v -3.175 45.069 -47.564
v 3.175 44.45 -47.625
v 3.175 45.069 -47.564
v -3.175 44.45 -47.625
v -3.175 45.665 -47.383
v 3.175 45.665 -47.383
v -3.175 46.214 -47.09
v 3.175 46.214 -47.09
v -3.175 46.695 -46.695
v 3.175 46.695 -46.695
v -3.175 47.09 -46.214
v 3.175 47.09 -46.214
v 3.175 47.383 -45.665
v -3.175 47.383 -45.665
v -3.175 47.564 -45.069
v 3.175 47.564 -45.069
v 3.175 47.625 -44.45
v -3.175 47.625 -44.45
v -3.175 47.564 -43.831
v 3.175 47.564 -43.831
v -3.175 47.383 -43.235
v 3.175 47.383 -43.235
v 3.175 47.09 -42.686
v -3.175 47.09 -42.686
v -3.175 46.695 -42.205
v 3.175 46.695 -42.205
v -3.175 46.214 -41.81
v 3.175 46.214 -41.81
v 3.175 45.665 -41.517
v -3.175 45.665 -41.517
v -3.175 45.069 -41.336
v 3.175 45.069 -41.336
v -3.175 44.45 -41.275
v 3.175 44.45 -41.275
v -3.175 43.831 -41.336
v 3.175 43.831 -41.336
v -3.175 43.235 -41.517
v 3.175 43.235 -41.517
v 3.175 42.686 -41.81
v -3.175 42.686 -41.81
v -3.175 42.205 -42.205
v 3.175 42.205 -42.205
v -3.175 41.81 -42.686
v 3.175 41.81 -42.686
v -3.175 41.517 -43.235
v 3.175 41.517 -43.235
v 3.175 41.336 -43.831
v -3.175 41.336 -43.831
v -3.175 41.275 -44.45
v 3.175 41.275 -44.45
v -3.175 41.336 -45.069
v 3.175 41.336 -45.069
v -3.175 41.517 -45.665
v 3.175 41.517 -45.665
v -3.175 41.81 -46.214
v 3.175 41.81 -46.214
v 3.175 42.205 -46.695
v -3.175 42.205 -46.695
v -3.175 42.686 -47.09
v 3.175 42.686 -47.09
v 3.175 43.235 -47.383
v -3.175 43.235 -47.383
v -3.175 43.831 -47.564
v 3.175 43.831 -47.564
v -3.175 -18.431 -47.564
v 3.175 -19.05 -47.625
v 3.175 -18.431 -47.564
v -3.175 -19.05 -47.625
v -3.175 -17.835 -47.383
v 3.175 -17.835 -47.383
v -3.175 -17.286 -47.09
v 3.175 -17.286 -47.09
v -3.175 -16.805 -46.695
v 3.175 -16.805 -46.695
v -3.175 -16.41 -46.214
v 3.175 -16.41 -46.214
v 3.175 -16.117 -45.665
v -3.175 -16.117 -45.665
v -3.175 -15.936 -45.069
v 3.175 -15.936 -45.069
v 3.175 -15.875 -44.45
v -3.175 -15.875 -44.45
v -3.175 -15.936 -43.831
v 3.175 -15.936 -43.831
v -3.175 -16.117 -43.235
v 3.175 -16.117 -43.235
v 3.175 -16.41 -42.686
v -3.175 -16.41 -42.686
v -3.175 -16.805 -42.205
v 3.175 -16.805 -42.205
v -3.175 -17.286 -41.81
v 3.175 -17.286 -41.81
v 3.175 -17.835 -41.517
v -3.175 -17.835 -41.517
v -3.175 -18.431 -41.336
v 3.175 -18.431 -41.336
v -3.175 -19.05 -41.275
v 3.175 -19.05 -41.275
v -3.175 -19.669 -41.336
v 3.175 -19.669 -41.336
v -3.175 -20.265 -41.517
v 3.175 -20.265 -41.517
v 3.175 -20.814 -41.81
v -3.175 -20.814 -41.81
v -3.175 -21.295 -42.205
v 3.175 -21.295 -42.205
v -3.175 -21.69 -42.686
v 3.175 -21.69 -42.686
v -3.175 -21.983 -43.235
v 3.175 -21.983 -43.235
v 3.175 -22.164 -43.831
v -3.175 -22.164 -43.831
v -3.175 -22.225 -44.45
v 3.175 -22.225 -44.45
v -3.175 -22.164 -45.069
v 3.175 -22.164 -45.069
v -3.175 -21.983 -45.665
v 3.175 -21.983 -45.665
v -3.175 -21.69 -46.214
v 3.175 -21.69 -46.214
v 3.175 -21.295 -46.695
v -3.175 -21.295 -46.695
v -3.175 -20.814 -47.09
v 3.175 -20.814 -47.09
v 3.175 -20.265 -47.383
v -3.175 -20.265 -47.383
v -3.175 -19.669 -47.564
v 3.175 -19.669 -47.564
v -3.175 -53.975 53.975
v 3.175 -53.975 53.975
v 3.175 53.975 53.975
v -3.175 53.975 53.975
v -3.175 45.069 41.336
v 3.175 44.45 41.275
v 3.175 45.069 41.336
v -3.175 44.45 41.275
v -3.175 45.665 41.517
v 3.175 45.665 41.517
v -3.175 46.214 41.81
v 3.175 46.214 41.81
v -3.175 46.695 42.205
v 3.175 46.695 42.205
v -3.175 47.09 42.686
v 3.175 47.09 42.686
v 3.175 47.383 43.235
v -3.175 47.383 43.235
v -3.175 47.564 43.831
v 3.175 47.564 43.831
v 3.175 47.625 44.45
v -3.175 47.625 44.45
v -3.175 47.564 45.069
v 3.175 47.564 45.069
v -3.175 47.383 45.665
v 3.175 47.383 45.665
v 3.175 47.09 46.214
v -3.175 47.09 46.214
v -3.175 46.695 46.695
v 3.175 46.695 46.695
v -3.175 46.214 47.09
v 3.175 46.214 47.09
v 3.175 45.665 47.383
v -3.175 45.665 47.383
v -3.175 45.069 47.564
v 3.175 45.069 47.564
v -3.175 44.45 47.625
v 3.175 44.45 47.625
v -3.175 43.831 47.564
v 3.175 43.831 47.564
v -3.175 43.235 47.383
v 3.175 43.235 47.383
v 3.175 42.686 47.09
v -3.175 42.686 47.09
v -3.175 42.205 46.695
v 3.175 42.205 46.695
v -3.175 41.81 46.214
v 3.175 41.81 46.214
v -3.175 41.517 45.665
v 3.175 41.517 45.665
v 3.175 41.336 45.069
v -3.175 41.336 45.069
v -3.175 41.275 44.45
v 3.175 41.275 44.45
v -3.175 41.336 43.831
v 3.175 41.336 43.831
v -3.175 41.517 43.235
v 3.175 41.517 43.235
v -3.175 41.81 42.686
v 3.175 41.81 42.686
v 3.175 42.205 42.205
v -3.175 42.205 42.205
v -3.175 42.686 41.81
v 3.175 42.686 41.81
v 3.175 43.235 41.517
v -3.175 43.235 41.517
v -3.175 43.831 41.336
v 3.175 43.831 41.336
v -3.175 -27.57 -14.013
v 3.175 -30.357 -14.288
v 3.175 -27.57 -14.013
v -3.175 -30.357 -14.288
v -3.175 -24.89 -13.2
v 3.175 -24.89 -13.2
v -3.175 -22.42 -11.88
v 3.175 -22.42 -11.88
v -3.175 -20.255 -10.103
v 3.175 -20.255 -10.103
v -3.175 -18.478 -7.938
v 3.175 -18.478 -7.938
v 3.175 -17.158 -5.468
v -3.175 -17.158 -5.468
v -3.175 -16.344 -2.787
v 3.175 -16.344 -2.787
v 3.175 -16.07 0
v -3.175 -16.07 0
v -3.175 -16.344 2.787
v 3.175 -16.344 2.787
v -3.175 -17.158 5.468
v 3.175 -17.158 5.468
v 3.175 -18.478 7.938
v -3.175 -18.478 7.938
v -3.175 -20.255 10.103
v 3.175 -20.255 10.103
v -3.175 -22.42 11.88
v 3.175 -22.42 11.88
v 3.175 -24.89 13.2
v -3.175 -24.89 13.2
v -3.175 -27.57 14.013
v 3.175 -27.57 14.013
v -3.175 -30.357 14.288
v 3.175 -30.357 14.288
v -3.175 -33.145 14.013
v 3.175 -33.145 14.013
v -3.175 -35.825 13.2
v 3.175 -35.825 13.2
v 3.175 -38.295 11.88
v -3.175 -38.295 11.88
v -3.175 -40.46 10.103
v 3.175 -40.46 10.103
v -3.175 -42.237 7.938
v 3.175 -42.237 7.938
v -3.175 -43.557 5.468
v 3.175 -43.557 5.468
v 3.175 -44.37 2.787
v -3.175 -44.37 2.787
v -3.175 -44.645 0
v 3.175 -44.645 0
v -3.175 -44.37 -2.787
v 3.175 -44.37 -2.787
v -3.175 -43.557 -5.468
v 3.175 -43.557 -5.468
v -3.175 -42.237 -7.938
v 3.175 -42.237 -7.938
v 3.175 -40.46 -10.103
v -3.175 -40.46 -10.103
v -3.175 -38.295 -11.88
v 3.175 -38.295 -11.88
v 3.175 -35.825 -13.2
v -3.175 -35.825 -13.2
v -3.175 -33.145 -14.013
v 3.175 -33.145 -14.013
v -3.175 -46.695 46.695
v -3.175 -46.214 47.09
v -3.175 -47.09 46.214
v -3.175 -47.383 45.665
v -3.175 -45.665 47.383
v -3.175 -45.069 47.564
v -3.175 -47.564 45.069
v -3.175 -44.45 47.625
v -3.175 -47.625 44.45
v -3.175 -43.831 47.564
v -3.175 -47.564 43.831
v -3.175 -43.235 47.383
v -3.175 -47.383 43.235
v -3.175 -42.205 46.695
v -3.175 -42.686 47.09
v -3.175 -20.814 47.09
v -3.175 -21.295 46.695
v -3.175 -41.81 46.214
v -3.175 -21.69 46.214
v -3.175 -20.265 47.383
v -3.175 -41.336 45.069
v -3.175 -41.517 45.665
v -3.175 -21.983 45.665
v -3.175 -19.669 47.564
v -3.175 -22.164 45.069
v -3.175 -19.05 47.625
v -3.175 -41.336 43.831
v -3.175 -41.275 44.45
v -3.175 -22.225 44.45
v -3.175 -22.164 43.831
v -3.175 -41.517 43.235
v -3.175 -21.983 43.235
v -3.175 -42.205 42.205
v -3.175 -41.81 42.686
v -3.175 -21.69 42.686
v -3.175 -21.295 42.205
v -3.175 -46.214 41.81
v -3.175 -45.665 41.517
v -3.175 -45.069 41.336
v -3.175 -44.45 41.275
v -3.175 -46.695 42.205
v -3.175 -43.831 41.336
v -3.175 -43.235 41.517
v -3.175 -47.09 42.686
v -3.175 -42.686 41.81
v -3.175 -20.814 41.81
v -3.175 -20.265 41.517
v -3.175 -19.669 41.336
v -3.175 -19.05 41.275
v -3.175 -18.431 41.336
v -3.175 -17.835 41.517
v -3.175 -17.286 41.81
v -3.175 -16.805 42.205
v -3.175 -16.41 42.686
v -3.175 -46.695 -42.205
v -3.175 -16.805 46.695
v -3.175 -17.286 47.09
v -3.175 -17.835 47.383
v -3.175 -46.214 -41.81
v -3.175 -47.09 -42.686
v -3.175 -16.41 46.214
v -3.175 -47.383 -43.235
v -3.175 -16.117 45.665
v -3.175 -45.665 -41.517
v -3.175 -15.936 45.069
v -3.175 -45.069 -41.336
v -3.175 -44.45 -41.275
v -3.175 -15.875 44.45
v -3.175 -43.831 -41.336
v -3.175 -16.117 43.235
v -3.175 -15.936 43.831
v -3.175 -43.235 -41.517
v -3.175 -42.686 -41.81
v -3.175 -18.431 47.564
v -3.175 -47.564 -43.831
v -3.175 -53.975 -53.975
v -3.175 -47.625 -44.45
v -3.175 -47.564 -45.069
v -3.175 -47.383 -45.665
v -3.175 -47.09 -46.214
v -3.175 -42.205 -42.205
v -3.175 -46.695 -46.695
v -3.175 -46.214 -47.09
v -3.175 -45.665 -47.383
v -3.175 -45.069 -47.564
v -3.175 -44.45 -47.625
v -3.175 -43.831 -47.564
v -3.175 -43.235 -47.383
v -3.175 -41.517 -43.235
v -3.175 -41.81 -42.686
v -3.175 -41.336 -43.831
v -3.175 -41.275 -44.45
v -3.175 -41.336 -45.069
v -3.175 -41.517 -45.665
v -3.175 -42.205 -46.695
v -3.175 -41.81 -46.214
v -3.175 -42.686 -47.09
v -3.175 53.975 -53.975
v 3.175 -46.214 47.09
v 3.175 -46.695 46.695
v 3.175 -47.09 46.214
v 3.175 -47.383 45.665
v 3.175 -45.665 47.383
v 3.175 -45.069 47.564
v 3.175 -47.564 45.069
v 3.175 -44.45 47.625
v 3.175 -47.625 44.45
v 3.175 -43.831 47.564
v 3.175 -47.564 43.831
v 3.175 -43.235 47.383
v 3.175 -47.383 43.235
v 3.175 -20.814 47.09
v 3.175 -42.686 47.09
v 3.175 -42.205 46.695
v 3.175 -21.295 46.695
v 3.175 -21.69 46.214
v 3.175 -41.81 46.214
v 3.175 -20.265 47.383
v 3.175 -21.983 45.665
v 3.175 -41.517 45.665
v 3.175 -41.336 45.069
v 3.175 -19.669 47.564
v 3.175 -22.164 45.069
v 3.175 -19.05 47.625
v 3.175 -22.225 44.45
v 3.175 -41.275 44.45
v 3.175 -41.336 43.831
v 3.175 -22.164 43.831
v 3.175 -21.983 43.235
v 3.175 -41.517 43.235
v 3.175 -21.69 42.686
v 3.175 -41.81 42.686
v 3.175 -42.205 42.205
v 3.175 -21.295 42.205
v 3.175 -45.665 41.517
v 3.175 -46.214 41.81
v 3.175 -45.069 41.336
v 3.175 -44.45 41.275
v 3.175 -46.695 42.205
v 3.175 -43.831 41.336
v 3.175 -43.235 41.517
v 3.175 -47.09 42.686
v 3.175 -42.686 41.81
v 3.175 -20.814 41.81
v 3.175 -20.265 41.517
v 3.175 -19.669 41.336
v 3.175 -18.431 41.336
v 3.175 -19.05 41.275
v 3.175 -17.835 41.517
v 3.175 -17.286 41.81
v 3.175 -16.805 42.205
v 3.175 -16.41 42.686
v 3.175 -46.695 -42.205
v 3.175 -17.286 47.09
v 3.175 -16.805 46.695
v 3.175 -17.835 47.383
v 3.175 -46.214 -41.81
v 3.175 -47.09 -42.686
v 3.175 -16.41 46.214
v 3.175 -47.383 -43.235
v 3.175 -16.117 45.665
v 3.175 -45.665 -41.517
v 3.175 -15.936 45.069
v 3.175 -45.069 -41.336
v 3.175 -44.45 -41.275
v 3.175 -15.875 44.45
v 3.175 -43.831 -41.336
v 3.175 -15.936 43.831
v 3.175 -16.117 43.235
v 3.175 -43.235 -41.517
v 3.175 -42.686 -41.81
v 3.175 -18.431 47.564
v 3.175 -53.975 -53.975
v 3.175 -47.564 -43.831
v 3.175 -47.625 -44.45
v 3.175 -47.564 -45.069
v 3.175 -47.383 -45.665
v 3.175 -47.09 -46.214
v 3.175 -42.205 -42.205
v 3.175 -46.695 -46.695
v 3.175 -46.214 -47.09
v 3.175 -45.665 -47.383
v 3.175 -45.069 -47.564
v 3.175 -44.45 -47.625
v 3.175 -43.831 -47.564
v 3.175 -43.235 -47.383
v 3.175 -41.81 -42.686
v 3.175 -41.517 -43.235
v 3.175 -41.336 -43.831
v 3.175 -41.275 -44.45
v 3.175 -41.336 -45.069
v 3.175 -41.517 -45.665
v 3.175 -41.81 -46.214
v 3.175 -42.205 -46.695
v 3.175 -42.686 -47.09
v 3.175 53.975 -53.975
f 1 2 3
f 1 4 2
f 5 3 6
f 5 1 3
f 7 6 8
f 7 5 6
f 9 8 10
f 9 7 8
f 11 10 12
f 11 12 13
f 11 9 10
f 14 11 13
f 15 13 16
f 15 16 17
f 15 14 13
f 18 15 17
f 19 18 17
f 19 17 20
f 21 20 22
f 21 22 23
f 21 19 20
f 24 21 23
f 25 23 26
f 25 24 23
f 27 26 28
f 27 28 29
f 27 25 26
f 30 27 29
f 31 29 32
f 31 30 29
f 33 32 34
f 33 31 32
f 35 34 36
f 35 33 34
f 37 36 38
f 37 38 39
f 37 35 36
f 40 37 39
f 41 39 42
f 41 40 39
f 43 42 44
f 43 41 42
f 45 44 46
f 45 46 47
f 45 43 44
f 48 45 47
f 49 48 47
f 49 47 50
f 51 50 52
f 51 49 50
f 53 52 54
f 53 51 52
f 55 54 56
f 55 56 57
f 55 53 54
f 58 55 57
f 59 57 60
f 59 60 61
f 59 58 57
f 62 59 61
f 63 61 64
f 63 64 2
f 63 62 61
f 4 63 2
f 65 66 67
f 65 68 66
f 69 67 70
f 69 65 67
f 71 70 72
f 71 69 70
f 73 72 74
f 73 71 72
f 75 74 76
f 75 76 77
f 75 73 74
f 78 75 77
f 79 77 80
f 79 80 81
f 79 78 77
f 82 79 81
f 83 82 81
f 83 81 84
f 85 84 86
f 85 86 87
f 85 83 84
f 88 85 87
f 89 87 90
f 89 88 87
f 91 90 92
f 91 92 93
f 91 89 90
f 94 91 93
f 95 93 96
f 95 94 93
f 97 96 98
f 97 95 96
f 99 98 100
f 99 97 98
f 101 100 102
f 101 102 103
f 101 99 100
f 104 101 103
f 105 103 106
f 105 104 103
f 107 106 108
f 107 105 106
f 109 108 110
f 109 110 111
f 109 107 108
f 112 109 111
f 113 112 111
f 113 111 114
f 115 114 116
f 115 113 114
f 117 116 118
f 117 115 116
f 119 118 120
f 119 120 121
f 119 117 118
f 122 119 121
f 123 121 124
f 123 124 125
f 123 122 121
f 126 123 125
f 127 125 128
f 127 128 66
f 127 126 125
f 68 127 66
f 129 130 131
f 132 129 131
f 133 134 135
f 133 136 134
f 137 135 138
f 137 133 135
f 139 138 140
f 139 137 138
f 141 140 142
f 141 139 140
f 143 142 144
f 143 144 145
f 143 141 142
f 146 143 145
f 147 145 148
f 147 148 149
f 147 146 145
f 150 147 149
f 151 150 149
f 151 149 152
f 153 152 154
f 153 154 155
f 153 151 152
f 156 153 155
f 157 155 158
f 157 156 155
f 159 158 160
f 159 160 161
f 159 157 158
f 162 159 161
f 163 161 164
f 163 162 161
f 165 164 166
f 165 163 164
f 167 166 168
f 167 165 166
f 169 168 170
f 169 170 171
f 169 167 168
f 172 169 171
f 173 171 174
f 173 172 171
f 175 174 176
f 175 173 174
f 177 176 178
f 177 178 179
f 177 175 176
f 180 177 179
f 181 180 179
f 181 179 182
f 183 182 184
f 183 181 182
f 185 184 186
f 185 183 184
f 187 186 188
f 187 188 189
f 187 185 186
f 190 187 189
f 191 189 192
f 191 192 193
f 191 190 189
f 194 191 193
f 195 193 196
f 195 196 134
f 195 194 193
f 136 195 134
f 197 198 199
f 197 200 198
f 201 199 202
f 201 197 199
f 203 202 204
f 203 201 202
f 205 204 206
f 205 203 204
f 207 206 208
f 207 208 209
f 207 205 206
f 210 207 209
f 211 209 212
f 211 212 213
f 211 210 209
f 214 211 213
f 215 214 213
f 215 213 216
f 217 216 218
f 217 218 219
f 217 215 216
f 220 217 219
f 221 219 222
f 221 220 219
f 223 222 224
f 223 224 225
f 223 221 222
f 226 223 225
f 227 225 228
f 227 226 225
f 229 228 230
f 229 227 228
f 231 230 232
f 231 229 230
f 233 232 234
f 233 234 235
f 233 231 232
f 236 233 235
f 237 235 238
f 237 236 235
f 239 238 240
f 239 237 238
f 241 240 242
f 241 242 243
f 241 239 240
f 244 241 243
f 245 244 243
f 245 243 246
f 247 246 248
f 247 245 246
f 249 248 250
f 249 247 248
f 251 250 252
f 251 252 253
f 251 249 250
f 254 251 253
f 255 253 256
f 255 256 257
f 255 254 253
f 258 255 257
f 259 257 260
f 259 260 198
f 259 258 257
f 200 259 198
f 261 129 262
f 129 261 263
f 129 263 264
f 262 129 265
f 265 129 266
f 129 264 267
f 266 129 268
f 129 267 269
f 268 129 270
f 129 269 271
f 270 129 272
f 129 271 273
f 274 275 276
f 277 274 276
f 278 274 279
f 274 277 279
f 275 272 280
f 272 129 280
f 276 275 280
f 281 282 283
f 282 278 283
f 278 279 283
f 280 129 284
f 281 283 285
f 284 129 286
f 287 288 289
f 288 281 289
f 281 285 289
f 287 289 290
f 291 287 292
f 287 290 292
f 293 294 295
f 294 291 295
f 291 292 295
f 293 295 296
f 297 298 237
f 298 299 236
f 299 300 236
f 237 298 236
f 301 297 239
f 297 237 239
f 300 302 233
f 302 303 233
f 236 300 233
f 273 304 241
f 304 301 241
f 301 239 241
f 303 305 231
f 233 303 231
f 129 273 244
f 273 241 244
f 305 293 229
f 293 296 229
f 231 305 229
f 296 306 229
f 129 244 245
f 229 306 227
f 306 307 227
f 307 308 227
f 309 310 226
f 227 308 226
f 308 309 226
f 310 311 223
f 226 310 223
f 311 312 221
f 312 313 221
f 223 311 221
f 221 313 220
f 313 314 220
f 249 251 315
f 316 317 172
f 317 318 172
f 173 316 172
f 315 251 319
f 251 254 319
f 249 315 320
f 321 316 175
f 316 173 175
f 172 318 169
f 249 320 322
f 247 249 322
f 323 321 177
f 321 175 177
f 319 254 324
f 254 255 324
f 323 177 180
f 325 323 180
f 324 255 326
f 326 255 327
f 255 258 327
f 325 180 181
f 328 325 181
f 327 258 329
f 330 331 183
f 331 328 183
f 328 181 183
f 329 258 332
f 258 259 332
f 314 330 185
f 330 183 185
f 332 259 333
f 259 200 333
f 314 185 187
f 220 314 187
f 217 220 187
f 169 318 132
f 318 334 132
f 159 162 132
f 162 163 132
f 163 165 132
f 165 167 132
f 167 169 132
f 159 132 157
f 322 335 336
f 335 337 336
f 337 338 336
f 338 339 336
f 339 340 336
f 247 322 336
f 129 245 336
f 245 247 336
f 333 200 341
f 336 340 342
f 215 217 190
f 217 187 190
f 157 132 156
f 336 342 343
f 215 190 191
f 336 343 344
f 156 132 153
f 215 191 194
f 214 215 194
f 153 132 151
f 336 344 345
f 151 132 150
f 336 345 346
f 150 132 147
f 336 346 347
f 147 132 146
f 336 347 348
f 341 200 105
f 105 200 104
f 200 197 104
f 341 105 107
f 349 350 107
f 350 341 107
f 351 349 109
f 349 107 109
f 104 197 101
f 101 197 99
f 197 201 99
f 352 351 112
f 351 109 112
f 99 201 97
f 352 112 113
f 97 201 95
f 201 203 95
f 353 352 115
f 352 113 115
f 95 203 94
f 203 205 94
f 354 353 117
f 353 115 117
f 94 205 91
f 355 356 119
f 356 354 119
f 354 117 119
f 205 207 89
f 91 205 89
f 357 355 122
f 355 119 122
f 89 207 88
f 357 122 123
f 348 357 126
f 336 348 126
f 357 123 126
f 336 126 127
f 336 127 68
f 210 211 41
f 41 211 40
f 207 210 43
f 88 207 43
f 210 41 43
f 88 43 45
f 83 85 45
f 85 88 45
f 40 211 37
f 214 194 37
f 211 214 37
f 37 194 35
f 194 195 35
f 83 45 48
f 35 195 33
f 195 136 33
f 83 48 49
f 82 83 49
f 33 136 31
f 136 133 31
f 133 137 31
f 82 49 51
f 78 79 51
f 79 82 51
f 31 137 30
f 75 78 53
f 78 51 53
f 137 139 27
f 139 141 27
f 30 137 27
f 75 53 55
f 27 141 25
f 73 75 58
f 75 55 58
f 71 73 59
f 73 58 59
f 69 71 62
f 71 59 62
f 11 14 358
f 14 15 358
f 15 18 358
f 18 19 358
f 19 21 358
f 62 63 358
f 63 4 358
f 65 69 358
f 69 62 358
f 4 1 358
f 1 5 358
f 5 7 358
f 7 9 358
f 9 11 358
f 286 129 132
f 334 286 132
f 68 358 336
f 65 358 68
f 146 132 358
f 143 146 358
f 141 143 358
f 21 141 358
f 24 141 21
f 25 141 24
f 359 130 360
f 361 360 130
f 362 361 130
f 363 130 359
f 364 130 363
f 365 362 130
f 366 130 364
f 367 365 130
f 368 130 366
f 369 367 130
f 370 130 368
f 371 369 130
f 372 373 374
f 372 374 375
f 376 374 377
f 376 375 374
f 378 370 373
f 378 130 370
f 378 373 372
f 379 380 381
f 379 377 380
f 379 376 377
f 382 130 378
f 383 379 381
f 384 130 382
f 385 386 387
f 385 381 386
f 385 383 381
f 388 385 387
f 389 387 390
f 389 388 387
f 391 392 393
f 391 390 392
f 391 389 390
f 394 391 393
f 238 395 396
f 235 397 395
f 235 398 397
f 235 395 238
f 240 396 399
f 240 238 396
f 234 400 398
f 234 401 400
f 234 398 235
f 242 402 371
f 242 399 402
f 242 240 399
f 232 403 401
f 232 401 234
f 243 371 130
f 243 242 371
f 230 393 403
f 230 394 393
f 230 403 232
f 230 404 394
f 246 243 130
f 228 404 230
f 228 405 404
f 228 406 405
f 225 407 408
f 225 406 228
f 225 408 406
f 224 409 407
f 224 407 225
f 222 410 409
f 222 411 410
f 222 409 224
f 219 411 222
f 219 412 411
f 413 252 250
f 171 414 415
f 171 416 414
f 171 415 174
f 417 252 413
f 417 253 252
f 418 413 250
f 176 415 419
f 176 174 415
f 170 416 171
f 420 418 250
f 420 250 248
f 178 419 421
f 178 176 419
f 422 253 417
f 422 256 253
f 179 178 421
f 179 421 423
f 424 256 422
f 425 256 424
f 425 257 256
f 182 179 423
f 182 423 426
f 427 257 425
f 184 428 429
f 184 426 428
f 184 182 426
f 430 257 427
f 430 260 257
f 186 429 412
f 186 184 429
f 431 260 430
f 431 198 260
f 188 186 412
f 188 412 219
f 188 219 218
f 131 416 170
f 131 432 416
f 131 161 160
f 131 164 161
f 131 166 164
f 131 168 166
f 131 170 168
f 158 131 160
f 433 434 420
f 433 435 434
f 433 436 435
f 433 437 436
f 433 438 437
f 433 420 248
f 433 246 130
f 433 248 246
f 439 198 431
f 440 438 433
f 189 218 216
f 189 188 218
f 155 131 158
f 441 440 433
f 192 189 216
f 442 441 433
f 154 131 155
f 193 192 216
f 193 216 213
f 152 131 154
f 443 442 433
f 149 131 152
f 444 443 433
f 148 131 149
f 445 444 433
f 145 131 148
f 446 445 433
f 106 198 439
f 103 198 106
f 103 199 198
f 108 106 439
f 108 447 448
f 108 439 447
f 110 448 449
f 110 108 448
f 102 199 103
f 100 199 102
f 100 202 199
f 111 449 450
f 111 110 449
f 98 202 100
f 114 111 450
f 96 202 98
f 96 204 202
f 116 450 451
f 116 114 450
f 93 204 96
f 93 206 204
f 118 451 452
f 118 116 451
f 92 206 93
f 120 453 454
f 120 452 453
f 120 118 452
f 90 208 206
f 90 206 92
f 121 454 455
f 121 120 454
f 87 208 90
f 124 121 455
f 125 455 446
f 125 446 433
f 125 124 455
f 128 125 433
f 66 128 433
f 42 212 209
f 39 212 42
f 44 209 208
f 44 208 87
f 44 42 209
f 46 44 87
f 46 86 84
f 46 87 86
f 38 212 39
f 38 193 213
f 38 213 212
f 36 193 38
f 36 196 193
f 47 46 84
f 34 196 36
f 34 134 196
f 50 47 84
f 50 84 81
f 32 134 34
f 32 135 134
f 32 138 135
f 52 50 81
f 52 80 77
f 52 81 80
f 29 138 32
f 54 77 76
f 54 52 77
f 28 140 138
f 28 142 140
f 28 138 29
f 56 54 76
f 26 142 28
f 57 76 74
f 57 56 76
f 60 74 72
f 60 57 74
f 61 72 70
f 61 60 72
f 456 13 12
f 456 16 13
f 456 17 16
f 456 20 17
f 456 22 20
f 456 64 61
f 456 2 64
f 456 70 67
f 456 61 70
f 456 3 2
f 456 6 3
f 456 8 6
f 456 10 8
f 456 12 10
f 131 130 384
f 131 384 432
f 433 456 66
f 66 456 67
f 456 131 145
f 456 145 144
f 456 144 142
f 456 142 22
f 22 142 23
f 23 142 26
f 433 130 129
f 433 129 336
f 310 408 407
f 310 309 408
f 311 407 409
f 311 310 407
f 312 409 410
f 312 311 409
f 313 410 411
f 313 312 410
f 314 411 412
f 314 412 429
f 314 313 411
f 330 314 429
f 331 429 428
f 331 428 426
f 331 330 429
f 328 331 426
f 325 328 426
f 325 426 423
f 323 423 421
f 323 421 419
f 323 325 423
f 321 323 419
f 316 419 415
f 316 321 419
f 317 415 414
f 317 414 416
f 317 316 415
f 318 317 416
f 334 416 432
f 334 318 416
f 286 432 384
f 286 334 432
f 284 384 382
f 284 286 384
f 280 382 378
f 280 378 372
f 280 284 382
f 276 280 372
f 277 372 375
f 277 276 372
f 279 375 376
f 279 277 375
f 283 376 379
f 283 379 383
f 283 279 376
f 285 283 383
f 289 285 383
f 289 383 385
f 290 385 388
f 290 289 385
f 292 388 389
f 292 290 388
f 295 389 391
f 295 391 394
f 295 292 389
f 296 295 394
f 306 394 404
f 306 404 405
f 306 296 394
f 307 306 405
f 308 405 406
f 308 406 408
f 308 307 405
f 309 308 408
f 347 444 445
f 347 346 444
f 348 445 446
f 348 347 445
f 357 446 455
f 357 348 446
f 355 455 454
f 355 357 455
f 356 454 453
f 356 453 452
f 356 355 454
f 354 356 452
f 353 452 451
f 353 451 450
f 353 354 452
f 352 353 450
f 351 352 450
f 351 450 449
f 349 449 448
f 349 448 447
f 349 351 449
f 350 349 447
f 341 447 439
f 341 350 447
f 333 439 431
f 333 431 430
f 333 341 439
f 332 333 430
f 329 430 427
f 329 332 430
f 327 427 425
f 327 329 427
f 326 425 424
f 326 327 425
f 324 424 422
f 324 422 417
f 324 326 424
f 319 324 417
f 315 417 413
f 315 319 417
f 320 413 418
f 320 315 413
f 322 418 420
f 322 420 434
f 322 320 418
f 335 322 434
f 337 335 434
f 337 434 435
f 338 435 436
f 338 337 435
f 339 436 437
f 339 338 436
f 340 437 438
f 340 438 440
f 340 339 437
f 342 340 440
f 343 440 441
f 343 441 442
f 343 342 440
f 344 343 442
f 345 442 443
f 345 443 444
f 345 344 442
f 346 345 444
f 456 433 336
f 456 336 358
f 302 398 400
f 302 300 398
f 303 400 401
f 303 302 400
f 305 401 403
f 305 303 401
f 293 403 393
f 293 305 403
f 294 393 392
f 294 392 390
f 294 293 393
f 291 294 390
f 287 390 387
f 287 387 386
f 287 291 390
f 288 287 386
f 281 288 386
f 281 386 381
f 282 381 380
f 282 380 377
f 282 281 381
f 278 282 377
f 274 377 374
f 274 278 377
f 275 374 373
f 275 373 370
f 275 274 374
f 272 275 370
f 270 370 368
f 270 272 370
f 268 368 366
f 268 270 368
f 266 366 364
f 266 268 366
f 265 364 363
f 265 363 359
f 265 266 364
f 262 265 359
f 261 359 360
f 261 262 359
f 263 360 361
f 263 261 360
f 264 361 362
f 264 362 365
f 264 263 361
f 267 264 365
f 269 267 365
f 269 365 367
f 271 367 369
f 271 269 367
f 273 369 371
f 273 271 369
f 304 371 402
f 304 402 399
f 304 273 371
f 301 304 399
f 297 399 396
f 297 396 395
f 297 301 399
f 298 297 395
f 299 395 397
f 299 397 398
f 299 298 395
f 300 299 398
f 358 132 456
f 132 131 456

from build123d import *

# Parameters (mm, degrees)
SKETCH1_W           = 107.95
SKETCH1_H           = 107.95
SKETCH1_R           = 3.175
SKETCH1_R_2         = 14.2875
BOSS_EXTRUDE1_DEPTH = 3.175


with BuildPart() as part:
    # Sketch1 → Boss-Extrude1 (new, symmetric)
    with BuildSketch(Plane(origin=(0, 0, 0), x_dir=(0, 0, -1), z_dir=(1, 0, 0))):
        Rectangle(SKETCH1_W, SKETCH1_H)
        with Locations((-44.45, 44.45)):
            Circle(SKETCH1_R, mode=Mode.SUBTRACT)
        with Locations((-44.45, -19.05)):
            Circle(SKETCH1_R, mode=Mode.SUBTRACT)
        with Locations((-44.45, -44.45)):
            Circle(SKETCH1_R, mode=Mode.SUBTRACT)
        with Locations((44.45, -44.45)):
            Circle(SKETCH1_R, mode=Mode.SUBTRACT)
        with Locations((44.45, -19.05)):
            Circle(SKETCH1_R, mode=Mode.SUBTRACT)
        with Locations((44.45, 44.45)):
            Circle(SKETCH1_R, mode=Mode.SUBTRACT)
        with Locations((0, -30.357466082)):
            Circle(SKETCH1_R_2, mode=Mode.SUBTRACT)
    extrude(amount=BOSS_EXTRUDE1_DEPTH, both=True)


solid = part.part
